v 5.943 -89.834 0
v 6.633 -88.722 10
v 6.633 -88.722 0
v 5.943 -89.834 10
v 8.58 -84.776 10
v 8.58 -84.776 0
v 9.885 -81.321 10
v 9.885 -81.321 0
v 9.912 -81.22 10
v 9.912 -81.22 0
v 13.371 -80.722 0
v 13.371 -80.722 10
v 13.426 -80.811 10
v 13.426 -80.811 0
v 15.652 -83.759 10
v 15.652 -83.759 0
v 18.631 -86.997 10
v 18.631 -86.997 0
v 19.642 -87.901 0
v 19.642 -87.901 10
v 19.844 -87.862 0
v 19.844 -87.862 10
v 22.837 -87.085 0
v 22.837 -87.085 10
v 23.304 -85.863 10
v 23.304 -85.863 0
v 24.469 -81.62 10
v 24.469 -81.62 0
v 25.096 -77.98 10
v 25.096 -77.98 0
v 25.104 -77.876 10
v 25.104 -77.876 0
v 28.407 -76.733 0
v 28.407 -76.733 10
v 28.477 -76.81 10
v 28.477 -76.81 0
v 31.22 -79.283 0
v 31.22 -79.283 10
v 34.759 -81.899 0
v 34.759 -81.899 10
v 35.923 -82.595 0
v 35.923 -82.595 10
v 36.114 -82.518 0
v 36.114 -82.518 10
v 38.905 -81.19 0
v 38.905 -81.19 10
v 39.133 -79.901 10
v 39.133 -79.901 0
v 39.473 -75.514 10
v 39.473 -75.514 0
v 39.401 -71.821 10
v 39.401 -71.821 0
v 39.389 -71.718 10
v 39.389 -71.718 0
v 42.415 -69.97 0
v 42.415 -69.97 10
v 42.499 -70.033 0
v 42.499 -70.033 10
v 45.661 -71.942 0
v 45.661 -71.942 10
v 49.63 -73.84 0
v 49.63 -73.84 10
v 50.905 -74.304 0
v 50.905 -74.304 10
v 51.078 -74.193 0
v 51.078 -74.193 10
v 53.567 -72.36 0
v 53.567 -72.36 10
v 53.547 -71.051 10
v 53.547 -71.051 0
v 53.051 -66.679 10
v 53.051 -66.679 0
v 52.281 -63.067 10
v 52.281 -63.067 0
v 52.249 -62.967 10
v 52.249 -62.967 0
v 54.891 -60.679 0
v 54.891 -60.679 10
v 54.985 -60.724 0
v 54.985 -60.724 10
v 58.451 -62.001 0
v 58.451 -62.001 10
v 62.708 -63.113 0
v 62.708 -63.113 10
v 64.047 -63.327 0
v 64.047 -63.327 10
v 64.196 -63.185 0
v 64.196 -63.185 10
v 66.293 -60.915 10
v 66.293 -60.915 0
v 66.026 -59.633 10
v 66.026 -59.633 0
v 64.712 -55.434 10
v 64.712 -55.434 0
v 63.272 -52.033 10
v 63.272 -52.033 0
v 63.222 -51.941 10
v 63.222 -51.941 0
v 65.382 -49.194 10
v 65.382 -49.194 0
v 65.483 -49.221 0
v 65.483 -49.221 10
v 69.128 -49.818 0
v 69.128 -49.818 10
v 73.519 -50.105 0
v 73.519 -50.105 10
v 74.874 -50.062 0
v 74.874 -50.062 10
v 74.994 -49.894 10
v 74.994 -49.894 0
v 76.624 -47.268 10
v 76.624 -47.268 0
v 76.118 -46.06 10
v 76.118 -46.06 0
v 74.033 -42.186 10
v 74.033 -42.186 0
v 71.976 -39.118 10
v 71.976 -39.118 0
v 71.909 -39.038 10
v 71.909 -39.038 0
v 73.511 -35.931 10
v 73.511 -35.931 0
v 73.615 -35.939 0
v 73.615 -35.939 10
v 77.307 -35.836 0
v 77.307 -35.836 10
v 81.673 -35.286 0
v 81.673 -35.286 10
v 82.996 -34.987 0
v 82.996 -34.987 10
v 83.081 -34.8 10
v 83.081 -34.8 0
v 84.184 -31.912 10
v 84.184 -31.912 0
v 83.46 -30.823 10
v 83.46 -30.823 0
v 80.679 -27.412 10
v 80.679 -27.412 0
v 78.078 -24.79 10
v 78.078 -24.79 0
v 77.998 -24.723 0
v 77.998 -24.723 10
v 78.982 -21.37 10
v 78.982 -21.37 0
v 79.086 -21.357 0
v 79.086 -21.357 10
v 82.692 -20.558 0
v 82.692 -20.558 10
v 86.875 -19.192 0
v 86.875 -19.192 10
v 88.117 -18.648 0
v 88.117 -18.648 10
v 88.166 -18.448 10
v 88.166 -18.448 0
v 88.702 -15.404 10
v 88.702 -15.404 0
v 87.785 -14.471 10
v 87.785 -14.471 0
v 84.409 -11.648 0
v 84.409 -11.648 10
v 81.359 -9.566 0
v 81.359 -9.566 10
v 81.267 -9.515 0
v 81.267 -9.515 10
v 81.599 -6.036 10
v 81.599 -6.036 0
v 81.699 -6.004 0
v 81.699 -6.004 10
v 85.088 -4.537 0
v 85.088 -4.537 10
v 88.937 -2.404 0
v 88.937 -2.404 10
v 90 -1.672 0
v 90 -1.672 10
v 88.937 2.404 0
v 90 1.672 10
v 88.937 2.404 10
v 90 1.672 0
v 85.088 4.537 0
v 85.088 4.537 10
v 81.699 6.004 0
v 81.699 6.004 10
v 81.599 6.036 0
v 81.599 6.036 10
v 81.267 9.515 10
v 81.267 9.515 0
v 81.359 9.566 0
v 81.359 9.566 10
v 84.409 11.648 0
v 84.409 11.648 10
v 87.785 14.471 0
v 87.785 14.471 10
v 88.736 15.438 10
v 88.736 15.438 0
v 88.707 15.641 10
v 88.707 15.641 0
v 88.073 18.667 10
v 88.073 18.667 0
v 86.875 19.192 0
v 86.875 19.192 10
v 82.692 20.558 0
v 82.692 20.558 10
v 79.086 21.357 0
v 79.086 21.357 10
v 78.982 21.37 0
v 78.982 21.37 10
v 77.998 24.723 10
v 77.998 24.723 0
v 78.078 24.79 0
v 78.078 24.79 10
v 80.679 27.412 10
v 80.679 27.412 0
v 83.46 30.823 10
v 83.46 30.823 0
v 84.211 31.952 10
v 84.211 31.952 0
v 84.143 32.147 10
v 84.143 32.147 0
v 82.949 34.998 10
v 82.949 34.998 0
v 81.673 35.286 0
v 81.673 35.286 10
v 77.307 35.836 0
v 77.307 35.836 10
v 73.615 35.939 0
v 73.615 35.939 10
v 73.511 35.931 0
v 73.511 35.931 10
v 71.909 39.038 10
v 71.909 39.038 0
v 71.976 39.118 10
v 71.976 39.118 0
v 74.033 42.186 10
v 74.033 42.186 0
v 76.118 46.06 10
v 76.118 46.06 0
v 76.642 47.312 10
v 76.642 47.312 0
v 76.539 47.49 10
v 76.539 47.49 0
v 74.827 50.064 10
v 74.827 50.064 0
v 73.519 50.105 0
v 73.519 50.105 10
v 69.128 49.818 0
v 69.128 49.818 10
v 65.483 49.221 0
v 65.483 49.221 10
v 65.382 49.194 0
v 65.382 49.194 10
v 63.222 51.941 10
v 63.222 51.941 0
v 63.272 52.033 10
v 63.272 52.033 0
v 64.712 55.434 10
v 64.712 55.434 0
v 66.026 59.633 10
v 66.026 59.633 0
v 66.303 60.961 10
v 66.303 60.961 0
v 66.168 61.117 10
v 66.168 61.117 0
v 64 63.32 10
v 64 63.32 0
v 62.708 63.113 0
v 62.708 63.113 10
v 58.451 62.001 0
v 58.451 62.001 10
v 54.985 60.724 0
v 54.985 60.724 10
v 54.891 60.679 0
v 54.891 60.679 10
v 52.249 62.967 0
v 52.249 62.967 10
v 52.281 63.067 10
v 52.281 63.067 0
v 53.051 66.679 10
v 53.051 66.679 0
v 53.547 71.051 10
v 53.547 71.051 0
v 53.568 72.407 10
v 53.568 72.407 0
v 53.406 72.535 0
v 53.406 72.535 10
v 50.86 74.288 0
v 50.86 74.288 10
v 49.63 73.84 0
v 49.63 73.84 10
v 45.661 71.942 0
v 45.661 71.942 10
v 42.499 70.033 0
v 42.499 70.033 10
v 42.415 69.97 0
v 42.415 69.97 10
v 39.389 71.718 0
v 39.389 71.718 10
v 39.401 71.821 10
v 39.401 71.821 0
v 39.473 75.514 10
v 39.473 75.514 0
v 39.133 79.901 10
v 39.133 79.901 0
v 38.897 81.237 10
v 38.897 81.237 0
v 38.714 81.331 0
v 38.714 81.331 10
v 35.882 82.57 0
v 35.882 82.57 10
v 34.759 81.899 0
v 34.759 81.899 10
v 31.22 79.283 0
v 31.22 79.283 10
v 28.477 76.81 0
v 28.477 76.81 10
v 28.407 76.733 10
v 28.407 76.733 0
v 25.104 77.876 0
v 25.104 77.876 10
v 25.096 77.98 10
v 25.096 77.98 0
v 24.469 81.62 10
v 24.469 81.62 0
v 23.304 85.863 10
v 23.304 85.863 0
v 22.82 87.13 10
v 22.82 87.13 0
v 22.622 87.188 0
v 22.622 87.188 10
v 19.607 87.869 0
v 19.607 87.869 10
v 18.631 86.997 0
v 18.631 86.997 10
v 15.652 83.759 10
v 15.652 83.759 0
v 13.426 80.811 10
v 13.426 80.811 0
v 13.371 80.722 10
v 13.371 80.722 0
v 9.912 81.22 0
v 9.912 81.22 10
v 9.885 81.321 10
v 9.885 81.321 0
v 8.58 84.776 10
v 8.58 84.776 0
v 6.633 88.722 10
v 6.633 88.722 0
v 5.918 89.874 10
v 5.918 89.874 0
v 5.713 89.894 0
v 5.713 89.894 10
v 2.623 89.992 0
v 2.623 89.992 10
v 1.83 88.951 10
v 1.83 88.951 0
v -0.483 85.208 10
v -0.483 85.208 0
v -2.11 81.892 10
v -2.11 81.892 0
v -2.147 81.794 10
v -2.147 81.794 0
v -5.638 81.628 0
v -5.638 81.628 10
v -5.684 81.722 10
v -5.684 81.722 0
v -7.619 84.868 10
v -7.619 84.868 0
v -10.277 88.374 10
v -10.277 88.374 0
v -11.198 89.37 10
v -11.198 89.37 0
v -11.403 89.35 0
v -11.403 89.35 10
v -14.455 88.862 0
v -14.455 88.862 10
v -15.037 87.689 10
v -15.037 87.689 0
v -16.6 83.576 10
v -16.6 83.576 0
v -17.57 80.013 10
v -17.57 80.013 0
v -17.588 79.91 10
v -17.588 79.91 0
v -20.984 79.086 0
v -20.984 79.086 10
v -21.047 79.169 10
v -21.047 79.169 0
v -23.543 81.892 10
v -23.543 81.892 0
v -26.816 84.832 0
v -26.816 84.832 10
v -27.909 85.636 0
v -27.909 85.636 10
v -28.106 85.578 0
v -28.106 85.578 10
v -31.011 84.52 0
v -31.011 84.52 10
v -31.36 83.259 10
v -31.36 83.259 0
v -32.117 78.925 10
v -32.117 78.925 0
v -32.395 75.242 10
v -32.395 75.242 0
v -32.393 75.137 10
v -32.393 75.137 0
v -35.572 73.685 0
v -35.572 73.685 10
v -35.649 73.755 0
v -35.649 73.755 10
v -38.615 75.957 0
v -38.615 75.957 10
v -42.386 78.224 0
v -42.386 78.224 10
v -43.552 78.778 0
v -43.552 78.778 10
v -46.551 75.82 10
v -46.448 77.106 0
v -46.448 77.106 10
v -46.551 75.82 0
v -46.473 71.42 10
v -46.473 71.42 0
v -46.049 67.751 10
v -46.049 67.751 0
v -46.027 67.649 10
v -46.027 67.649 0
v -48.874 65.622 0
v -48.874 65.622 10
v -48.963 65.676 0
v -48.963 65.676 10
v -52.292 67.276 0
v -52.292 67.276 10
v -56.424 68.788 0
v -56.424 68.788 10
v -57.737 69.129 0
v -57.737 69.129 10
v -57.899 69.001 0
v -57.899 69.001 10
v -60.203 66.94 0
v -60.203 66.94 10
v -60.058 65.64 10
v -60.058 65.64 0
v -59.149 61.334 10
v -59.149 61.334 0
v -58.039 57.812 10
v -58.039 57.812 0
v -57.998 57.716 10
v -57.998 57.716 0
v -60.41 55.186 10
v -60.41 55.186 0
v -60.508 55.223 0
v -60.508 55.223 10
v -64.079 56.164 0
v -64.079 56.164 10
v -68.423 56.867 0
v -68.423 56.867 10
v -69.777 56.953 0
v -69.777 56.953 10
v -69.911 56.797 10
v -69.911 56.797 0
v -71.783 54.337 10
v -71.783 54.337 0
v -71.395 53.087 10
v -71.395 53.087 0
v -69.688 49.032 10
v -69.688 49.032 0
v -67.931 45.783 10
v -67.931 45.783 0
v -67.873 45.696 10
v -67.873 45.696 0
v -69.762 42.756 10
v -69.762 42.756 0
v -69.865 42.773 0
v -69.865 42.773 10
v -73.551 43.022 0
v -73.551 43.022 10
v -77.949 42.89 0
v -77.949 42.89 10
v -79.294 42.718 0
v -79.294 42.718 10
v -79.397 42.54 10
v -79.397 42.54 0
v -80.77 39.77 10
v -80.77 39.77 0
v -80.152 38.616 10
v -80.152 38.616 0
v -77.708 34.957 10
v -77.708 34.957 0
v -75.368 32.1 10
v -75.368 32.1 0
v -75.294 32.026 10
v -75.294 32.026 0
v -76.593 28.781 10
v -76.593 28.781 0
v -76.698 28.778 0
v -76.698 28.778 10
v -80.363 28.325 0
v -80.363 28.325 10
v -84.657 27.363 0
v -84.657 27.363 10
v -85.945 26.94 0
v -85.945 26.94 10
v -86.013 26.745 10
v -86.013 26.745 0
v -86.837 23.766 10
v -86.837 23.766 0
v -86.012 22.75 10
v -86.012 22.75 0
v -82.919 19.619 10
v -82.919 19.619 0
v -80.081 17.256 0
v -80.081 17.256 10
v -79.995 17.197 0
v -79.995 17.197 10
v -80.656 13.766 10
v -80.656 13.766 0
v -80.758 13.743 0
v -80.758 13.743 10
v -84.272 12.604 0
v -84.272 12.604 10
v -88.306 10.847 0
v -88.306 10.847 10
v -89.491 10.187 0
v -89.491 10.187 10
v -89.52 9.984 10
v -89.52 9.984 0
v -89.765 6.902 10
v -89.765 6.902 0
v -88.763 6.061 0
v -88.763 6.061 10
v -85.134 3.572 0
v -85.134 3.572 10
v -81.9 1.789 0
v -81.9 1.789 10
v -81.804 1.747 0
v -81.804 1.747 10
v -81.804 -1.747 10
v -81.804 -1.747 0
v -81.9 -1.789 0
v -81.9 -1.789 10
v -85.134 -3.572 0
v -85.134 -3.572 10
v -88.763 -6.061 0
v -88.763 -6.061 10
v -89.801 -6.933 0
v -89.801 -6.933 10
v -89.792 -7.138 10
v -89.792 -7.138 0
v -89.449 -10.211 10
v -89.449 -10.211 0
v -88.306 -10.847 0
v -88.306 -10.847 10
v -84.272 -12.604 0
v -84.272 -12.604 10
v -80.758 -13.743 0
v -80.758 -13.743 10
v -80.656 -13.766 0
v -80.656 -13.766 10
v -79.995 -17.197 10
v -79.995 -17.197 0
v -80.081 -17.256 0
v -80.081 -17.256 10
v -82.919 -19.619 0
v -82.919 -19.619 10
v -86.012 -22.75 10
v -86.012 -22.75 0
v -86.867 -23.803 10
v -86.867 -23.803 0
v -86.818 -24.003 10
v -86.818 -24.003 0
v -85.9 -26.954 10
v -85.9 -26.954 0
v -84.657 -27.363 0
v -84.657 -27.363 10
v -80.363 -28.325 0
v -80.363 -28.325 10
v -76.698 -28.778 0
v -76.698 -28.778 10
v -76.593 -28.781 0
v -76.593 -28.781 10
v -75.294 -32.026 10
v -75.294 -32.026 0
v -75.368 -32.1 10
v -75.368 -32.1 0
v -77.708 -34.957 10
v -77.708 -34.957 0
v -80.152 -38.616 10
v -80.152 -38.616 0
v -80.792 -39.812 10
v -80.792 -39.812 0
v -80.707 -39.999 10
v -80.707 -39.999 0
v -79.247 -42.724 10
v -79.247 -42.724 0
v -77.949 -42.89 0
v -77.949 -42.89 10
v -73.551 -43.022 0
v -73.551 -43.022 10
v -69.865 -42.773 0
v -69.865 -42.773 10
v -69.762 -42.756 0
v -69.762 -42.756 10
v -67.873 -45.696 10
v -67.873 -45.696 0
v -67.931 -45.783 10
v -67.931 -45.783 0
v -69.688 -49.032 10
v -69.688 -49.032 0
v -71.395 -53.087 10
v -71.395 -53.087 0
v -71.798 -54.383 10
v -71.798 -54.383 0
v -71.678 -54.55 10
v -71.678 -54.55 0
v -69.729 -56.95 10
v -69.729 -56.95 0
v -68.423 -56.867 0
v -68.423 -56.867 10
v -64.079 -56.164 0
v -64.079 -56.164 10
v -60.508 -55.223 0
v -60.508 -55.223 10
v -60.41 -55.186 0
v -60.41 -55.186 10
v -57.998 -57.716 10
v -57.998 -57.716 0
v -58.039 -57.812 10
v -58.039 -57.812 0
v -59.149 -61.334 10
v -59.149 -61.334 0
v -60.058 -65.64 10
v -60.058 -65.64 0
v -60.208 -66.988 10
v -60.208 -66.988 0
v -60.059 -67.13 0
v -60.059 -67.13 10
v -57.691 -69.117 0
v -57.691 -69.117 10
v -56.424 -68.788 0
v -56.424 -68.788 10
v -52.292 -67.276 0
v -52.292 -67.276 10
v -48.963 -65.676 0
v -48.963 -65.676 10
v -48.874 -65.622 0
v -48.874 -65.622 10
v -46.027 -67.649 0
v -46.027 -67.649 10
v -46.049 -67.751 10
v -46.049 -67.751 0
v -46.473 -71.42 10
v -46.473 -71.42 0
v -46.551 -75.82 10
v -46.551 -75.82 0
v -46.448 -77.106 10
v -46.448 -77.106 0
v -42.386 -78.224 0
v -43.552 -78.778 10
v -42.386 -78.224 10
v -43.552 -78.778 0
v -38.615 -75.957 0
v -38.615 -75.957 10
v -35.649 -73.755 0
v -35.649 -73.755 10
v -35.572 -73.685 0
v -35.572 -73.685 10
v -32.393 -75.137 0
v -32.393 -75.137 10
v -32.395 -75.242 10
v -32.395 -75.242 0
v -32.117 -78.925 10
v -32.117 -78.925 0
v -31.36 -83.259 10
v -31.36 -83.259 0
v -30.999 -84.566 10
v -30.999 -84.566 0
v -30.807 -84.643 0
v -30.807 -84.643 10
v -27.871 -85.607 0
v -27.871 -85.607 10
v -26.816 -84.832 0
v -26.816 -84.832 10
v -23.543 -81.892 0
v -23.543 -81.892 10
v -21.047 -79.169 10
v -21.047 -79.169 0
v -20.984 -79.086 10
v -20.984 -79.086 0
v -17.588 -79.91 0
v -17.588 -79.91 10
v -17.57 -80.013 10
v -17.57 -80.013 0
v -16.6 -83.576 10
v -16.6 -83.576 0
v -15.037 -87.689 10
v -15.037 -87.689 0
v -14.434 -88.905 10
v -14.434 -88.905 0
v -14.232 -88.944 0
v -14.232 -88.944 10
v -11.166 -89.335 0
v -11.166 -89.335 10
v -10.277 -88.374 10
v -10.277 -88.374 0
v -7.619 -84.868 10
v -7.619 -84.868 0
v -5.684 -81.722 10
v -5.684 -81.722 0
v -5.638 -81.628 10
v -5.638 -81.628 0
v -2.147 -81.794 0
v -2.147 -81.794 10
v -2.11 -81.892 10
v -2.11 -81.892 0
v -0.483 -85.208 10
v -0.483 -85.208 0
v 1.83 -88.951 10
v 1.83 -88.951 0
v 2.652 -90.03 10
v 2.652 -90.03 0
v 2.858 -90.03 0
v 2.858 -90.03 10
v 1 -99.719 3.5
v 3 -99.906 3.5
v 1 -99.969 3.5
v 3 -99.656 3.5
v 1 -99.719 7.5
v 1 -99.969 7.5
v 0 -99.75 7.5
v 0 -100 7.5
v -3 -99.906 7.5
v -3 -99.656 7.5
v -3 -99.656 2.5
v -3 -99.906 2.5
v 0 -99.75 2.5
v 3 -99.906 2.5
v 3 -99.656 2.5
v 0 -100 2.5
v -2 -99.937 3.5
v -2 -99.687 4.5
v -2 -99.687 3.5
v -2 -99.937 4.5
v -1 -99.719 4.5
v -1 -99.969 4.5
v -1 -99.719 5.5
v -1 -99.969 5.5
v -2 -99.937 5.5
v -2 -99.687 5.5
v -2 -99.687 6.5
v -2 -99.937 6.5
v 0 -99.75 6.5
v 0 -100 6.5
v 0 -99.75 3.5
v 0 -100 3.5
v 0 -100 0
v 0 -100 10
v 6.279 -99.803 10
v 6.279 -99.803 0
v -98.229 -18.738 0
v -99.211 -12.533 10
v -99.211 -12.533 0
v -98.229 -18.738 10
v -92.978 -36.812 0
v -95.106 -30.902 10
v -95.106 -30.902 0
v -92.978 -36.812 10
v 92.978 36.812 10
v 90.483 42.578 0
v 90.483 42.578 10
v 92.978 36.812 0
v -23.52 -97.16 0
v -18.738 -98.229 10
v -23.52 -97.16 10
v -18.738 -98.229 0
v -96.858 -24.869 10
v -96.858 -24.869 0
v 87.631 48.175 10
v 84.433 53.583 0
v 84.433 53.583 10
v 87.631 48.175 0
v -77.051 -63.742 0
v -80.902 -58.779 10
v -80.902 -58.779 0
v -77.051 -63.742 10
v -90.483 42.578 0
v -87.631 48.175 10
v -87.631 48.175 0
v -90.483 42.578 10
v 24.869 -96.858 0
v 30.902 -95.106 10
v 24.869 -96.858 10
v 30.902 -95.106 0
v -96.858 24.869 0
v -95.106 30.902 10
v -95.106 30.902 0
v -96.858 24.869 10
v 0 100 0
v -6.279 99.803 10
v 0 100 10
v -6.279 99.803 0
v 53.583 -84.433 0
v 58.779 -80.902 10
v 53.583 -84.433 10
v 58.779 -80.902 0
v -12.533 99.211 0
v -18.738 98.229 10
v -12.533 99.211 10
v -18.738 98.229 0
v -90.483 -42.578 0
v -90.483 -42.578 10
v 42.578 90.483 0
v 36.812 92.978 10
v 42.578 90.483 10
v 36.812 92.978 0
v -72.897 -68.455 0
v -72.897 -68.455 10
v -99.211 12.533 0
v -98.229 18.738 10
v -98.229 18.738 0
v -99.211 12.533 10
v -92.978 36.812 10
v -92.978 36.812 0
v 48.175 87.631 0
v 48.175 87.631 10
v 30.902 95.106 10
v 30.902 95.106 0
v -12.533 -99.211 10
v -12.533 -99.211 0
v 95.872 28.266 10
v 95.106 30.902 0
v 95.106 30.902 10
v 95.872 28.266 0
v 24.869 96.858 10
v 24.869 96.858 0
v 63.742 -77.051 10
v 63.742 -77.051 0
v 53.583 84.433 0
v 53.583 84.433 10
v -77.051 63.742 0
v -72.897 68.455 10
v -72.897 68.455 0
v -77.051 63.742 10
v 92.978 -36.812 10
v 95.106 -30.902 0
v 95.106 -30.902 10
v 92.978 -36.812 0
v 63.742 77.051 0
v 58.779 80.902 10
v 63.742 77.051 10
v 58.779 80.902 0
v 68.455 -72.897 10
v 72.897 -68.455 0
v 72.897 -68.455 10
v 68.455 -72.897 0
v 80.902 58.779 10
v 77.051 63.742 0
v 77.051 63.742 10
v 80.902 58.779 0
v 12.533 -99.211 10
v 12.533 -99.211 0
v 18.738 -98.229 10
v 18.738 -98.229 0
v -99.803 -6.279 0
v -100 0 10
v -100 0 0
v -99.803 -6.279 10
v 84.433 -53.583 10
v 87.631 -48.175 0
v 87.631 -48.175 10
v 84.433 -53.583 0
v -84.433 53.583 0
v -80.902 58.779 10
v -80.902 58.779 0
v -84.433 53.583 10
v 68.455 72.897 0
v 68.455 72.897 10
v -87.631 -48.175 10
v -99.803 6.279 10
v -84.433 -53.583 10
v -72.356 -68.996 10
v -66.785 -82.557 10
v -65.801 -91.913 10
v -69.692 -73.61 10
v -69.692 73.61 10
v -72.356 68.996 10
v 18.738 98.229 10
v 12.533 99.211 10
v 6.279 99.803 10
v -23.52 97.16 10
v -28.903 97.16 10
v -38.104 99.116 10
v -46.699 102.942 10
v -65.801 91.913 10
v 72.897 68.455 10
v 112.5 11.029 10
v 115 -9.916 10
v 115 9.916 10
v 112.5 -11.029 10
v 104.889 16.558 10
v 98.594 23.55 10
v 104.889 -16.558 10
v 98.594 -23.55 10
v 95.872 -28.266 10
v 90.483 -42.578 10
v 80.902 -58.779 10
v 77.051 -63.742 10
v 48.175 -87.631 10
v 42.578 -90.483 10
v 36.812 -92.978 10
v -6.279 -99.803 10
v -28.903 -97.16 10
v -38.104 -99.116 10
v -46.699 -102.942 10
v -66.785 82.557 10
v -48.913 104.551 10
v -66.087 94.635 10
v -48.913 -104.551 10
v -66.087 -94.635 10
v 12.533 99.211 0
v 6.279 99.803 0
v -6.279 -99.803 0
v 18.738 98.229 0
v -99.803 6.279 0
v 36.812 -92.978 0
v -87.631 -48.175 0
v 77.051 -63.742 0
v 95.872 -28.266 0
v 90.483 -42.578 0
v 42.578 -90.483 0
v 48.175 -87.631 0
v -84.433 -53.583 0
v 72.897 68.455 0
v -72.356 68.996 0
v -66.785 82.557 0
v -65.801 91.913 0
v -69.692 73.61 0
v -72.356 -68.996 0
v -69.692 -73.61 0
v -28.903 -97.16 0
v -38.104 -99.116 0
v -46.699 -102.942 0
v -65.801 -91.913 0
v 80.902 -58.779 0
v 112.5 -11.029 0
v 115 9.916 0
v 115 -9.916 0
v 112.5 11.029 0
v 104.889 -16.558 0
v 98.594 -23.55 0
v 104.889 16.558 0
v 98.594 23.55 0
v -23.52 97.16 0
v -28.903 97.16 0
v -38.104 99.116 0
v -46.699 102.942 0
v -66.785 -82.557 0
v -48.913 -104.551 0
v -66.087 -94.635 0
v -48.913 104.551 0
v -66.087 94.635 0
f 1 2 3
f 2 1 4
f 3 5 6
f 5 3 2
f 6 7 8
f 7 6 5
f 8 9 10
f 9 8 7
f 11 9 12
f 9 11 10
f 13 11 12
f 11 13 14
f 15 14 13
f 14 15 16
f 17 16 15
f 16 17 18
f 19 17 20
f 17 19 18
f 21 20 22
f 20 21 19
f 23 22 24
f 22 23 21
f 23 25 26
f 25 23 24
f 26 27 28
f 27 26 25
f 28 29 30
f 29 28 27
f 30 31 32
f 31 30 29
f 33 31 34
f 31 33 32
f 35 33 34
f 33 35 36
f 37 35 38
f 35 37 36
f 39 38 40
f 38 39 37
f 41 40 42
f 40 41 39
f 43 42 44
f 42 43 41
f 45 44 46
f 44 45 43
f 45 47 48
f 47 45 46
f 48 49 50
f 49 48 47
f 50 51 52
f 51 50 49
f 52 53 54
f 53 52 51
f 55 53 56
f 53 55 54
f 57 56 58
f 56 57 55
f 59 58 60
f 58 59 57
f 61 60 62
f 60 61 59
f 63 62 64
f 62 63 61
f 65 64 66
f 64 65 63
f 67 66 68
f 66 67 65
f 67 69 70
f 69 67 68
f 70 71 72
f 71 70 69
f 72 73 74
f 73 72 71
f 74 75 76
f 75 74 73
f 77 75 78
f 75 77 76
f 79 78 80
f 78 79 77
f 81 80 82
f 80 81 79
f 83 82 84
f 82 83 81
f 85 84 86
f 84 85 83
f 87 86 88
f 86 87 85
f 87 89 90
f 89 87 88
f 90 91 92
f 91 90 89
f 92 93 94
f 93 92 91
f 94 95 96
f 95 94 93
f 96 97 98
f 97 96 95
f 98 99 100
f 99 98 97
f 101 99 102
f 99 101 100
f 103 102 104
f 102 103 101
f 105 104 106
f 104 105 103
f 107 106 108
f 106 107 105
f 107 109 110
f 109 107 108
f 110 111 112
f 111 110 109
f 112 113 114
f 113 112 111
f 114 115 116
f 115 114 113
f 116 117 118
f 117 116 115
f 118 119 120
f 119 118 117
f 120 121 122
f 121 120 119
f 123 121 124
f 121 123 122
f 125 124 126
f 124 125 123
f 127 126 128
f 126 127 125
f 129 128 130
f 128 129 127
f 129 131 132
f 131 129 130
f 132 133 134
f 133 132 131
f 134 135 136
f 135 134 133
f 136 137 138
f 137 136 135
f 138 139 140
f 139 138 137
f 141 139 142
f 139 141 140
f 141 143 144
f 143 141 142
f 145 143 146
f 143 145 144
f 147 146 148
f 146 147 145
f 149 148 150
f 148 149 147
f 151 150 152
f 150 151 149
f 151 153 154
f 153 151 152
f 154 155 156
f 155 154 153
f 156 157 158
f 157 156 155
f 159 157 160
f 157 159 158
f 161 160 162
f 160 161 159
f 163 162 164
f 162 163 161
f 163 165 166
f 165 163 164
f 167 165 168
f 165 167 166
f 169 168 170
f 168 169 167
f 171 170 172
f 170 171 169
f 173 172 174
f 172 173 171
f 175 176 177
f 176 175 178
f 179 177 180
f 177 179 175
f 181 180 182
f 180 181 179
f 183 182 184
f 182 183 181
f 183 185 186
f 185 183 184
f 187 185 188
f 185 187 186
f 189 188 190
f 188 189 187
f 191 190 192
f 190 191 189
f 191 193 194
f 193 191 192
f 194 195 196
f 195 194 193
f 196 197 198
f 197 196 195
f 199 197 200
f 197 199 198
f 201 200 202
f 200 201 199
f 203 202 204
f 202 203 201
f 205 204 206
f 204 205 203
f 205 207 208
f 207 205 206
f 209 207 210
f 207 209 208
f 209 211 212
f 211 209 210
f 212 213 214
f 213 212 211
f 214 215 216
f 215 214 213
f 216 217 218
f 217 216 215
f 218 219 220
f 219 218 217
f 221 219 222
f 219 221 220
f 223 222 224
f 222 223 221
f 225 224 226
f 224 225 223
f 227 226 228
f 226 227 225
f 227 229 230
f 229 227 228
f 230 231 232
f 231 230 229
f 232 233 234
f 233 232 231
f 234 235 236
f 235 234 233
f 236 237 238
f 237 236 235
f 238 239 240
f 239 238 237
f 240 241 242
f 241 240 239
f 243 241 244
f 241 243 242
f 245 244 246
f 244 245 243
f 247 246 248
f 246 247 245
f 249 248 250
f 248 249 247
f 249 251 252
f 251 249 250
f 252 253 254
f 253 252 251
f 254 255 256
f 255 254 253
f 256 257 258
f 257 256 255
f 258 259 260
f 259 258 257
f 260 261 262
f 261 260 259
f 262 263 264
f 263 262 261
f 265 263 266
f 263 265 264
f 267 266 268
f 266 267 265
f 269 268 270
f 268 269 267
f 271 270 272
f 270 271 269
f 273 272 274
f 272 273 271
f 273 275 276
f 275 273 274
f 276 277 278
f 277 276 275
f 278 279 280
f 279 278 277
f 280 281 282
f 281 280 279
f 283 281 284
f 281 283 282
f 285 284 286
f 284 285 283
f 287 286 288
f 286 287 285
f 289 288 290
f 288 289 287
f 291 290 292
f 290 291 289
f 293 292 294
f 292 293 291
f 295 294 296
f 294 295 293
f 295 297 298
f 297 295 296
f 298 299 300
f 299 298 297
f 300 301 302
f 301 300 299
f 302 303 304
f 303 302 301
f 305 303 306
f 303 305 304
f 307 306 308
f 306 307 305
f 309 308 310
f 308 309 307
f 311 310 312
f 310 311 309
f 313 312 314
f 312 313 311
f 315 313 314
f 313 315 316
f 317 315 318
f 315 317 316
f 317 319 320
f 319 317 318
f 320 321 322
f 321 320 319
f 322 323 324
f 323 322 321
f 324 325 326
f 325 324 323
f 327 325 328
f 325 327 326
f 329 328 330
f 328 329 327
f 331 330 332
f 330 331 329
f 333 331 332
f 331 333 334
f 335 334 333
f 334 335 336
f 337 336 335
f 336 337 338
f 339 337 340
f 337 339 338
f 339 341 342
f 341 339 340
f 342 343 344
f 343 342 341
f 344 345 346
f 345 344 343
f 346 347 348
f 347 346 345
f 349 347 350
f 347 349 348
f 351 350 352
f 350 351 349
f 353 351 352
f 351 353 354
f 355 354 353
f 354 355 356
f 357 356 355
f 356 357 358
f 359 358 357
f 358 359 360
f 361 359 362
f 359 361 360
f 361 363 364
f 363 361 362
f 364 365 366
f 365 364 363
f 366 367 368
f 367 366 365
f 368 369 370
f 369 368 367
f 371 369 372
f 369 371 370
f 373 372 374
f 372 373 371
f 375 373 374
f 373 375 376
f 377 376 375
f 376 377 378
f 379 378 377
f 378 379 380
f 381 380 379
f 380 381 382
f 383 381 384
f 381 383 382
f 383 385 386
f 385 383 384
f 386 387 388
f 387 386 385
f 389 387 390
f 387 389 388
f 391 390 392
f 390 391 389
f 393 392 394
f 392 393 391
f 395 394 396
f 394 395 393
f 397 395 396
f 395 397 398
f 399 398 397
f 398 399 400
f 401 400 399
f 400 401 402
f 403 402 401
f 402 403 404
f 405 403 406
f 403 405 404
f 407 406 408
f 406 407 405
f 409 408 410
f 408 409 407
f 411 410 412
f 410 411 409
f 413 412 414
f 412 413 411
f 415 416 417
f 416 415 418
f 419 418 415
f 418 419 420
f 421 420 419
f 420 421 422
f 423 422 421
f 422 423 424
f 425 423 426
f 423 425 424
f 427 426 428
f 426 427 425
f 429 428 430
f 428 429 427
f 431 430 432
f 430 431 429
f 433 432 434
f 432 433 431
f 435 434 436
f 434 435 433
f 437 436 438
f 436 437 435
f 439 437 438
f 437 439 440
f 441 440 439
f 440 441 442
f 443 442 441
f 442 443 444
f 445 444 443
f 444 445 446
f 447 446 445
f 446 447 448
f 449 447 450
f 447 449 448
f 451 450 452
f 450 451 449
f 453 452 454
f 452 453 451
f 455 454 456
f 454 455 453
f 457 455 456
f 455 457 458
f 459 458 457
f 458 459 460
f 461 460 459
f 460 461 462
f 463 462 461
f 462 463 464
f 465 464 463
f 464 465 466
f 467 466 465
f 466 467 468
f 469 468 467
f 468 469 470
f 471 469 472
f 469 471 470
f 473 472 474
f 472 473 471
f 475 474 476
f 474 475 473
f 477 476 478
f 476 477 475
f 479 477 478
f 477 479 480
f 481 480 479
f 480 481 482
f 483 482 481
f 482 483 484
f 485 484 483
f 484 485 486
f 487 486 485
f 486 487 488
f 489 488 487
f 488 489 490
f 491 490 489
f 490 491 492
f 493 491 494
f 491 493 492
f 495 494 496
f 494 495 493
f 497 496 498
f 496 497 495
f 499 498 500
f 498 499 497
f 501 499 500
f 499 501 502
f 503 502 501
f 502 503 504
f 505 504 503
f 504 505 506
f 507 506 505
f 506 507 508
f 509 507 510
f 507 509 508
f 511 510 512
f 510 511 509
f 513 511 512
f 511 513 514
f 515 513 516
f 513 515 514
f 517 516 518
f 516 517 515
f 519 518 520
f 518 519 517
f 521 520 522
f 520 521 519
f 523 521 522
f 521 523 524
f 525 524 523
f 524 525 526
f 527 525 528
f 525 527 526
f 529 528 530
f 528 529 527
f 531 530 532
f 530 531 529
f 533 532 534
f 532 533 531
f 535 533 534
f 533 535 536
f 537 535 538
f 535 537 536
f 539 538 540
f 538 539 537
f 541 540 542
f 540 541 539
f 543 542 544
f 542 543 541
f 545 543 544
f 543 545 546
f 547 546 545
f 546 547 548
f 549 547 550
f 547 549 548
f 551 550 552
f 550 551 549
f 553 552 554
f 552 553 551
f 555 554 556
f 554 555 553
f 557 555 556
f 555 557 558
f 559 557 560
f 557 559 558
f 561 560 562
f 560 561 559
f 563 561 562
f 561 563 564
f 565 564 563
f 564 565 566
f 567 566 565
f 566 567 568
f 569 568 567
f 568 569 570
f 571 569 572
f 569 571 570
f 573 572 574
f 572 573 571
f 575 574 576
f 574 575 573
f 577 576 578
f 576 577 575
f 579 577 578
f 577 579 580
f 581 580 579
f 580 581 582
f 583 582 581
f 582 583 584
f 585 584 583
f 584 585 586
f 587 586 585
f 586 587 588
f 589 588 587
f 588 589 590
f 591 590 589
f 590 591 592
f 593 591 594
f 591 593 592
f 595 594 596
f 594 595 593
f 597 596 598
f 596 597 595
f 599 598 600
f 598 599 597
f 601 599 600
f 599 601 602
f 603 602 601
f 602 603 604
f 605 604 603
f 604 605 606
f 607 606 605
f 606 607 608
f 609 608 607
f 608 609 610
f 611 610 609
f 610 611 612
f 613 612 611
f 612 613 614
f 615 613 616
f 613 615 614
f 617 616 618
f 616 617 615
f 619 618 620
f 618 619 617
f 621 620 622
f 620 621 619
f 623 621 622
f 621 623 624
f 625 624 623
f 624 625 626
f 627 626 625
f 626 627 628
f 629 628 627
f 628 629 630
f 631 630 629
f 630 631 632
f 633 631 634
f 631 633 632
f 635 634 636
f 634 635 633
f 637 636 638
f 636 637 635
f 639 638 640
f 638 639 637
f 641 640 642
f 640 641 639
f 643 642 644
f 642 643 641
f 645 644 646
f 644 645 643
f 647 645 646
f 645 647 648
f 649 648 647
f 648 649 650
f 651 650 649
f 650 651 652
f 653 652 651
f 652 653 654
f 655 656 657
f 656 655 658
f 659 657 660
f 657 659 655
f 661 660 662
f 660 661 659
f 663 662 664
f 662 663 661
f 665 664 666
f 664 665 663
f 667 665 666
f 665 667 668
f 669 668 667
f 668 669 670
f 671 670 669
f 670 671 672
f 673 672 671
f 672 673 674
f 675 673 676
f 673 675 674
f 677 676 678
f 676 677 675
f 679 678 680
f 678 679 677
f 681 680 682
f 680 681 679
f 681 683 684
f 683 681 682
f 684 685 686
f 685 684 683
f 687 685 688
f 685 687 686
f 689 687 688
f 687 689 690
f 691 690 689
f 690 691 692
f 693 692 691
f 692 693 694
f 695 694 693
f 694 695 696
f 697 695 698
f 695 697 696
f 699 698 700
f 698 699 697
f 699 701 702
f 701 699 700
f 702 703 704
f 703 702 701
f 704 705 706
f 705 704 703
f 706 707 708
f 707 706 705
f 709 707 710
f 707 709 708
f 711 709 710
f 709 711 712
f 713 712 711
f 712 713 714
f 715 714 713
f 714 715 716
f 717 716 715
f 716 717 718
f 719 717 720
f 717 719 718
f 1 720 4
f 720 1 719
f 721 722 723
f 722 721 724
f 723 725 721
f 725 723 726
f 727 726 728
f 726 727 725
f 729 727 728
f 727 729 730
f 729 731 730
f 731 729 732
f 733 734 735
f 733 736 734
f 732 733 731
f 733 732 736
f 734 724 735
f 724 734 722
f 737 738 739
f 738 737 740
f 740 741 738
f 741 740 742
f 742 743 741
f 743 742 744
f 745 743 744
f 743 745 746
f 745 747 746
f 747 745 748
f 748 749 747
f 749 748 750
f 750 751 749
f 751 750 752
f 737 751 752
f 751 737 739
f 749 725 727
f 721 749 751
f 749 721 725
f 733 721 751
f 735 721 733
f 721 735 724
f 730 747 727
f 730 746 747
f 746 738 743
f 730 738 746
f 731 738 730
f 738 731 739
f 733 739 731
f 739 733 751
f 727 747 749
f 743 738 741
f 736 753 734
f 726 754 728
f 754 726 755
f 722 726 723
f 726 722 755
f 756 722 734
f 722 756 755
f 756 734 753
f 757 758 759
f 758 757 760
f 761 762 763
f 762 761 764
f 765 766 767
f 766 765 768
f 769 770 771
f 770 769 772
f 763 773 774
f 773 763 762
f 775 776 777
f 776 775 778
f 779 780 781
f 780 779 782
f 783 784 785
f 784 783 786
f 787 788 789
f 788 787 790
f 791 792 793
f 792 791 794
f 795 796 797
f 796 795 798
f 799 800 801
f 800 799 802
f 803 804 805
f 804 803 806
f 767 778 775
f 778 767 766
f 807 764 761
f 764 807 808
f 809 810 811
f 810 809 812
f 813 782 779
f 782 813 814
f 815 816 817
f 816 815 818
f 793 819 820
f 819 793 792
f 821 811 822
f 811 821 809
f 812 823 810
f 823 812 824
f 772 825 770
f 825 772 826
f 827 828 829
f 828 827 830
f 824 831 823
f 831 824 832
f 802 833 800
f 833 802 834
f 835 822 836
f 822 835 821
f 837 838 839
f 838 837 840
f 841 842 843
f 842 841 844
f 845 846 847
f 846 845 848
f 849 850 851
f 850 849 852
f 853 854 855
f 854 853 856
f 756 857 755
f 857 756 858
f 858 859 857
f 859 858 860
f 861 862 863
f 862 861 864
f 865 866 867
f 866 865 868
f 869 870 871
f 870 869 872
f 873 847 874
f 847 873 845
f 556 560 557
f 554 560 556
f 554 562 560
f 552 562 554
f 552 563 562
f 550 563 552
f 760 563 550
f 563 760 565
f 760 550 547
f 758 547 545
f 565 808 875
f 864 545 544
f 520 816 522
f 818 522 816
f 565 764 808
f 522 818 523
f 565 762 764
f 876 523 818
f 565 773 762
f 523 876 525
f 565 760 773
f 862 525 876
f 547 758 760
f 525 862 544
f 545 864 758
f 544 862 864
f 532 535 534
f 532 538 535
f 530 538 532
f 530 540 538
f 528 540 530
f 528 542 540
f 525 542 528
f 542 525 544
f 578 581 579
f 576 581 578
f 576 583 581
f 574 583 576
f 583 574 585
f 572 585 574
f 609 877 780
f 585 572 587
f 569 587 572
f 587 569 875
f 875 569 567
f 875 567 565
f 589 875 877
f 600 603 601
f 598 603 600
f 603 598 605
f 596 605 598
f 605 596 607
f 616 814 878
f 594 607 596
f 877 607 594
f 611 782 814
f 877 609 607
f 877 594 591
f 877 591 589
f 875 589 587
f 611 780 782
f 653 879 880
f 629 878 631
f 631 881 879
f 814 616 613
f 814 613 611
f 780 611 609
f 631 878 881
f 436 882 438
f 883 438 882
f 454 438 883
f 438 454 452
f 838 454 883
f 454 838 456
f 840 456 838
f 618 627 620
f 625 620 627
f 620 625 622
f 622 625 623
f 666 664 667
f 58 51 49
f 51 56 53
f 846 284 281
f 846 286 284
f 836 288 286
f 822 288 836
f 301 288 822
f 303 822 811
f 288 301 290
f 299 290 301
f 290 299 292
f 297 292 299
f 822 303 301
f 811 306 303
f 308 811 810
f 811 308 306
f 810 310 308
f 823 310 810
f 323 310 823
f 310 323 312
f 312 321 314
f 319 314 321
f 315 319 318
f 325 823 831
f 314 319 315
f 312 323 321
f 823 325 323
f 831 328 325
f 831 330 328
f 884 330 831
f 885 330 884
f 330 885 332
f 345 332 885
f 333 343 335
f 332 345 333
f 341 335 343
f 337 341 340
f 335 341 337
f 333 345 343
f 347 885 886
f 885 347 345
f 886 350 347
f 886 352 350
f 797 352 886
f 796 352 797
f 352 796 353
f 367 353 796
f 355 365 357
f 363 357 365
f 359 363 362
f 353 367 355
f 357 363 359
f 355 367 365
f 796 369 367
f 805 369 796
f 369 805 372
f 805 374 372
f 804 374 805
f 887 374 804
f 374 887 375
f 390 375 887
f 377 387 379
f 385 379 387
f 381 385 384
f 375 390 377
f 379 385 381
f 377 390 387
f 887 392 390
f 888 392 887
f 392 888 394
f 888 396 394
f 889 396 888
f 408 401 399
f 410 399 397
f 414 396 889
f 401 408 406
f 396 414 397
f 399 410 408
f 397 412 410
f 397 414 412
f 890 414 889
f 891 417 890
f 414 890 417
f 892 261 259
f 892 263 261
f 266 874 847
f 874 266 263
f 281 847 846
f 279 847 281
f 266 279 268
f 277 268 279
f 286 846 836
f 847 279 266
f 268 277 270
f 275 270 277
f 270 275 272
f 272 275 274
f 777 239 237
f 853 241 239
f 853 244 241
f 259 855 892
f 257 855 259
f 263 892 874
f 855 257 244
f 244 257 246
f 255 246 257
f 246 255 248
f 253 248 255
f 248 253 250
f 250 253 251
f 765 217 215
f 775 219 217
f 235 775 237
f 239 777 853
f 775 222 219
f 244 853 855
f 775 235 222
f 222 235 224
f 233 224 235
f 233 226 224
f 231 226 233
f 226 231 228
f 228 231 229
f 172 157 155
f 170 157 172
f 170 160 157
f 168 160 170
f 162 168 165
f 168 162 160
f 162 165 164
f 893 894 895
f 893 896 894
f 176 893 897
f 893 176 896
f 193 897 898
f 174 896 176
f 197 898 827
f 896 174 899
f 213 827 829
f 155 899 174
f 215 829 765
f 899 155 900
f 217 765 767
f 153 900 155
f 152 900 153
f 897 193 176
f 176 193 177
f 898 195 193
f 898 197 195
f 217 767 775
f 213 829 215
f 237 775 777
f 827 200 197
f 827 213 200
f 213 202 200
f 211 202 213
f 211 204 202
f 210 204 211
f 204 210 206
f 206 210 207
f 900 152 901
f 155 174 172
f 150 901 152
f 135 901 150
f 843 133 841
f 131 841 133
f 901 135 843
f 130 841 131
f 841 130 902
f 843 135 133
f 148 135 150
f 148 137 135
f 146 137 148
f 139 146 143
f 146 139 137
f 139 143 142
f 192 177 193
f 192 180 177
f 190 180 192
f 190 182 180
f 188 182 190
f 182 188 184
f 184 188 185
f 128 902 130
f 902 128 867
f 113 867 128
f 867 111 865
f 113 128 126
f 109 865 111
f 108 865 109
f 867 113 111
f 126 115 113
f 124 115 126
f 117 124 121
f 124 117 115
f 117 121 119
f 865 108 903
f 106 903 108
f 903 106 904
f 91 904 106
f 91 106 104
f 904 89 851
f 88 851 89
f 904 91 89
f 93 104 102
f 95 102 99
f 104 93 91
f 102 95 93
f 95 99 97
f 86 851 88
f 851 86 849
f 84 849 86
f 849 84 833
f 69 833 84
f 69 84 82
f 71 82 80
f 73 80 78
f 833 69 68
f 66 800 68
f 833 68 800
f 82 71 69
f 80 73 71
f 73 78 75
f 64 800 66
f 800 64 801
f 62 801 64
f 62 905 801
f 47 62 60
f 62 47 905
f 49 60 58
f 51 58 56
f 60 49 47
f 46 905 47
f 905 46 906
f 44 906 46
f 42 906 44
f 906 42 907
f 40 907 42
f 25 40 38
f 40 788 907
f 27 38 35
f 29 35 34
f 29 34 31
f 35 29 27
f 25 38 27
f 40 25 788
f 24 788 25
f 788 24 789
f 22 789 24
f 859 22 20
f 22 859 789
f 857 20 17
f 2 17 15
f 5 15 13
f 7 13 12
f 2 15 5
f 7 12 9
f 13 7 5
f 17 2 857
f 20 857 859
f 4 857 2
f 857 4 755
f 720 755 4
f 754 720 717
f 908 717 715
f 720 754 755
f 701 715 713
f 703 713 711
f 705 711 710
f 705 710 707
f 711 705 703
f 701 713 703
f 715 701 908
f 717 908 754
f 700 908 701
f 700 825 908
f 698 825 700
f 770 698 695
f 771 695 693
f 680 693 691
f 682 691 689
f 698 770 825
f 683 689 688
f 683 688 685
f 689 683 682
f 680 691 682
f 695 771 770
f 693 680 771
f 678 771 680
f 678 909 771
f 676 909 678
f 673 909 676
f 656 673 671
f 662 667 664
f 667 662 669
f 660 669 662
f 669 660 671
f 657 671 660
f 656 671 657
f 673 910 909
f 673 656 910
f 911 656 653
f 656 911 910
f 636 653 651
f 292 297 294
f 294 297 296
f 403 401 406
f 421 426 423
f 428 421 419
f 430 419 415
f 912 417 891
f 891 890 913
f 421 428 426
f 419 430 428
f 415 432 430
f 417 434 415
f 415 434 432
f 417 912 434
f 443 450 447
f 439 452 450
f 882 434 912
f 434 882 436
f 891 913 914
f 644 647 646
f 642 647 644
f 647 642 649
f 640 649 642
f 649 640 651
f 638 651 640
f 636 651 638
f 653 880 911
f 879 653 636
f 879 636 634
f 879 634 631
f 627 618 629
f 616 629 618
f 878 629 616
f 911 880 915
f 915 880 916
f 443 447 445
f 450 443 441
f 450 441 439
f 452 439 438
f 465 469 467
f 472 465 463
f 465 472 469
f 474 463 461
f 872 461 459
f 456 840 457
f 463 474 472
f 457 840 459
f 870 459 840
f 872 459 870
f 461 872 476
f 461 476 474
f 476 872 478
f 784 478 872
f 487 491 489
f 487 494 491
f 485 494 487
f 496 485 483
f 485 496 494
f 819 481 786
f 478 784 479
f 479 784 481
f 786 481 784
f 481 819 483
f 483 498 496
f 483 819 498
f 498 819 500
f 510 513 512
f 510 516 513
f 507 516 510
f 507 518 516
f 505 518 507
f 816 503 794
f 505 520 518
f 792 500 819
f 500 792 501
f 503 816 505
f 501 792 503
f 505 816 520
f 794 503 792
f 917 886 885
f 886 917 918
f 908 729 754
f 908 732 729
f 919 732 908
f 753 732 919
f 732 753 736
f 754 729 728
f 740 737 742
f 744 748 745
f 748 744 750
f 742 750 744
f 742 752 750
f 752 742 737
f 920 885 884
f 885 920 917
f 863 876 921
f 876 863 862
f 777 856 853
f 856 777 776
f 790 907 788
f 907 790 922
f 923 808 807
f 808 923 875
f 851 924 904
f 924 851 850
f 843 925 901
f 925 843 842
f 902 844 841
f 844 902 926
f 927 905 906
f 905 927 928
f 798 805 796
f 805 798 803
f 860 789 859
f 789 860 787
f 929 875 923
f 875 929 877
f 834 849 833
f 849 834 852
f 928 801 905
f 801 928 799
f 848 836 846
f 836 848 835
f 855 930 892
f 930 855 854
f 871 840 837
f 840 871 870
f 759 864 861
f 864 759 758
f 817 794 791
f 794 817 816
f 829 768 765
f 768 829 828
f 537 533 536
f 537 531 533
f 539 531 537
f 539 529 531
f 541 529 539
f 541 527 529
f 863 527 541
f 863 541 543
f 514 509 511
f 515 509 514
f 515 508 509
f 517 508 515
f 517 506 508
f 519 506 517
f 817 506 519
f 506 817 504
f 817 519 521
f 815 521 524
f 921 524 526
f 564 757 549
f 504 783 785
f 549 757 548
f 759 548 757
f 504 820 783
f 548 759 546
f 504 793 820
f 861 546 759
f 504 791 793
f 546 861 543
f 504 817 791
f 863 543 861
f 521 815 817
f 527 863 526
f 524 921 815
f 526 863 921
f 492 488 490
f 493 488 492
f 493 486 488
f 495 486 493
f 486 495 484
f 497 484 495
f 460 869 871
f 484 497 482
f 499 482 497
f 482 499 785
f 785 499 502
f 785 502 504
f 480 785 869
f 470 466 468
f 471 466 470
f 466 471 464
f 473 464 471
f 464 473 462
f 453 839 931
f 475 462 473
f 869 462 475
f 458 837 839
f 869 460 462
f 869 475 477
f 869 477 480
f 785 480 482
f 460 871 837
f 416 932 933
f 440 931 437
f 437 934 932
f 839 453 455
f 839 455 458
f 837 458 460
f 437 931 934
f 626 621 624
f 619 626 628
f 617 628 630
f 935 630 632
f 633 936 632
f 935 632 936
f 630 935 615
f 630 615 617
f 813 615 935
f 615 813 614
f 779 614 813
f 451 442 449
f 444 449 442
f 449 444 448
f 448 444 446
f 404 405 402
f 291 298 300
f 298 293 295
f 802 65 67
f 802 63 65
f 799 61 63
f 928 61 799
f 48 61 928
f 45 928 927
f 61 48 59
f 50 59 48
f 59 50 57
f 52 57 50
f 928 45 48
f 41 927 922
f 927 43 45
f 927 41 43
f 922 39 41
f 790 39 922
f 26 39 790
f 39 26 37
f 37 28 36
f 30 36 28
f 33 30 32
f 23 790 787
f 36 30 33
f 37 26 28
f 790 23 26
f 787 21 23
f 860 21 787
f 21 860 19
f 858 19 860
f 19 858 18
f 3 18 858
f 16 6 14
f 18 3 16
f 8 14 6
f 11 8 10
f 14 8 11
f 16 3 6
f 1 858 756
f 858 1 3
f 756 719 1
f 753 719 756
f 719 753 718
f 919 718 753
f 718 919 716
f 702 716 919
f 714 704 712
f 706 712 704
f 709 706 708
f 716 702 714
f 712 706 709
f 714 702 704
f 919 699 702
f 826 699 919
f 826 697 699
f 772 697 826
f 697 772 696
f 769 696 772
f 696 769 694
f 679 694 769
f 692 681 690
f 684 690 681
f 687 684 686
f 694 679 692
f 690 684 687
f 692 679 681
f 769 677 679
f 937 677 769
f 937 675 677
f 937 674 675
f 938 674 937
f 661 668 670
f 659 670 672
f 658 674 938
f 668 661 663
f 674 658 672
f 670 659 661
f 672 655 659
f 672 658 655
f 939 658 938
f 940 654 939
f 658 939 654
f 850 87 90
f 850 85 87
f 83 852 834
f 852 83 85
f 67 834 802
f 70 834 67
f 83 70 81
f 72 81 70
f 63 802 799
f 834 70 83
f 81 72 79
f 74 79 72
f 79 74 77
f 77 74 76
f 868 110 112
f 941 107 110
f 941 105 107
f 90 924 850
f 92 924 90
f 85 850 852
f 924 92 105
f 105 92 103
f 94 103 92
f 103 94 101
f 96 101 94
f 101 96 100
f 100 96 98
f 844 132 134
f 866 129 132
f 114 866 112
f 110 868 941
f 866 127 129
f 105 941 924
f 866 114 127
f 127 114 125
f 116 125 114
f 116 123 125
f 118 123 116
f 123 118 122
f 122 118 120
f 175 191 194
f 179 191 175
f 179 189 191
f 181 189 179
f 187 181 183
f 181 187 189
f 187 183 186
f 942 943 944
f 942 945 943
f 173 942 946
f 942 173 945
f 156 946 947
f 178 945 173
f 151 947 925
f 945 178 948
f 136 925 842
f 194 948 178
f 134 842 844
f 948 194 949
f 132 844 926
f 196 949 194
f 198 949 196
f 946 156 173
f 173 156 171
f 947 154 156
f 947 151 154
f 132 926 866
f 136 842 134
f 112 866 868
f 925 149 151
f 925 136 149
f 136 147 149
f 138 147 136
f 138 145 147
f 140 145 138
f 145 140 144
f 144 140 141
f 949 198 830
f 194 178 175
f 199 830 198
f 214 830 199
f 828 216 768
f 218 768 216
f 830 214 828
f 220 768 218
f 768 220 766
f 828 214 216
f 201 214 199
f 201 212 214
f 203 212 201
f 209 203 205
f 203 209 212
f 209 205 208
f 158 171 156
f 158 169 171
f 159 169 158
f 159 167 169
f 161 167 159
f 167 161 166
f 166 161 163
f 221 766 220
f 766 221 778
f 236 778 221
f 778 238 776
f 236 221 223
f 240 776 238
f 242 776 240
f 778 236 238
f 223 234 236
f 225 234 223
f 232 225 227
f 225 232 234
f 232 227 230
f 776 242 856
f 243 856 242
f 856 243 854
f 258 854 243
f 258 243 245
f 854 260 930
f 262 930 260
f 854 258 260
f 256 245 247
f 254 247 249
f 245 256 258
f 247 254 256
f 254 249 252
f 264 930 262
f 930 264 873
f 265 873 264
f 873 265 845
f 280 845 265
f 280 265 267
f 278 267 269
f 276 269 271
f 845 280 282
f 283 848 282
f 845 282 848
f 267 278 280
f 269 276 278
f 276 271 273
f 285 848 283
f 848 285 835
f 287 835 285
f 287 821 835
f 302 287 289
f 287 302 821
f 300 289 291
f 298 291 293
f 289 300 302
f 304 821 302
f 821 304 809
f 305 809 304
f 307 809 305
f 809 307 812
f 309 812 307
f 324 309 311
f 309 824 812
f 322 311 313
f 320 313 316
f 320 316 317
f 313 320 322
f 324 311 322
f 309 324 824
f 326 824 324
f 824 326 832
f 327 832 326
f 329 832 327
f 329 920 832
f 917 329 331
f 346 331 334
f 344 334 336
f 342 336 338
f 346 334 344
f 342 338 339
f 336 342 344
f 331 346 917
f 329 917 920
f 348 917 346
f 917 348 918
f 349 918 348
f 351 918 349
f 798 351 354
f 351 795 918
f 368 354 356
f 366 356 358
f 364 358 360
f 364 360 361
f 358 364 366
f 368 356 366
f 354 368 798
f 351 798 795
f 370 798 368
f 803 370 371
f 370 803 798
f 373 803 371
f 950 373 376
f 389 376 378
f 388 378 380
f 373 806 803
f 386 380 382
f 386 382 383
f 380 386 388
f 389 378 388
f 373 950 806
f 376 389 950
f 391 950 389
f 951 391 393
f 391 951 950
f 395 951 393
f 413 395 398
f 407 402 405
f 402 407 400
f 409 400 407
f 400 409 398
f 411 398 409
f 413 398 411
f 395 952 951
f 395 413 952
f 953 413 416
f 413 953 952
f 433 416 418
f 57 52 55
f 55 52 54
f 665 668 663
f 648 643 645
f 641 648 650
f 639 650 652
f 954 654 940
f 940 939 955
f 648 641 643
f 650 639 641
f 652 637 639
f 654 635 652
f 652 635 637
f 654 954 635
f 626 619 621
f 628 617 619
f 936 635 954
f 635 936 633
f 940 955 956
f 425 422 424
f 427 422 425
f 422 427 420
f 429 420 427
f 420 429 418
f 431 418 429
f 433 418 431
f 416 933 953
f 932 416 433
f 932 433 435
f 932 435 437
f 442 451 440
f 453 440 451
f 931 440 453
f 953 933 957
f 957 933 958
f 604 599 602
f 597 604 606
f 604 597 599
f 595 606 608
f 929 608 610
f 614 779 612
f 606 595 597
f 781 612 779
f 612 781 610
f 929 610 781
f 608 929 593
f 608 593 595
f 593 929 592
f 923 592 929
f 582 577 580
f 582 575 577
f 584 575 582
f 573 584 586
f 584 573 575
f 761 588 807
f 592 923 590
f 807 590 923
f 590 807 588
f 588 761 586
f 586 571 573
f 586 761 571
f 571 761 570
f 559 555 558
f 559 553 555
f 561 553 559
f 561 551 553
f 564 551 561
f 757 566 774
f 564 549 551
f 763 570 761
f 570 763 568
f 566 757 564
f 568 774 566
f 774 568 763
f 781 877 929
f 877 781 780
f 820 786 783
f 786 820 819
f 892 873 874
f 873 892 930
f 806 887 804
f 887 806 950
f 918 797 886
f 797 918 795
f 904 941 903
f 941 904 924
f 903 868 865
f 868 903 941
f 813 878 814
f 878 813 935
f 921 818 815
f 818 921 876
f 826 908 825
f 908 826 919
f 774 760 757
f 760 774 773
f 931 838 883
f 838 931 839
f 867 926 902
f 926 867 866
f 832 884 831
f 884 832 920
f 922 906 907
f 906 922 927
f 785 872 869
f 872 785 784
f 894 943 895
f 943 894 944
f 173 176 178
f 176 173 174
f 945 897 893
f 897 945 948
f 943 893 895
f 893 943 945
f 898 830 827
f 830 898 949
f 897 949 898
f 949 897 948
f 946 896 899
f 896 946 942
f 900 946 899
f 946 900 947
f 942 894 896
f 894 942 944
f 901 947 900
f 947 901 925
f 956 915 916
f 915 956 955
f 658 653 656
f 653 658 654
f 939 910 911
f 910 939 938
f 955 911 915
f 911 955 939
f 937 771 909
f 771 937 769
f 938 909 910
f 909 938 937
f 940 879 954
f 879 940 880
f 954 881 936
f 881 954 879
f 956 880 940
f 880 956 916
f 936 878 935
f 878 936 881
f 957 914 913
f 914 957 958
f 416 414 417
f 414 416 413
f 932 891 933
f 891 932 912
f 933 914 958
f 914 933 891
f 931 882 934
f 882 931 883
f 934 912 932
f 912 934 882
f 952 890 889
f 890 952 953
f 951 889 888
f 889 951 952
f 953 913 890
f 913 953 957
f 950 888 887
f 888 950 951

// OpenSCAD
// Planetary gear bearing (customizable)

// outer diameter of ring
D=200;
// thickness
T=10;
// clearance
tol=0.15;
number_of_planets=3;
number_of_teeth_on_planets=12;
approximate_number_of_teeth_on_sun=8;
// pressure angle
P=30;//[30:60]
// number of teeth to twist across
nTwist=0;
// Shaft radius.  For round saft with a flat.
sd=27.9;
// Shaft thinkness at flat  For round saft with a flat..
st=27.9;
// Shaft type: 0=hex, 1=round w/flat.
stype=1;
// Planet axile diameter.
pad=10;

DR=0.5*1;// maximum depth ratio of teeth

m=round(number_of_planets);
np=round(number_of_teeth_on_planets);
ns1=approximate_number_of_teeth_on_sun;
k1=round(2/m*(ns1+np));
k= k1*m%2!=0 ? k1+1 : k1;
ns=k*m/2-np;
echo(ns);
nr=ns+2*np;
pitchD=0.9*D/(1+min(PI/(2*nr*tan(P)),PI*DR/nr));
pitch=pitchD*PI/nr;
echo(pitch);
helix_angle=atan(2*nTwist*pitch/T);
echo(helix_angle);

phi=$t*360/m;

translate([0,0,T/2]){
	difference(){ // This makes the outer ring.
		cylinder(r=D/2,h=T,center=true,$fn=100);
		herringbone(nr,pitch,P,DR,-tol,helix_angle,T+0.2);
		difference(){
			translate([0,-D/2,0])rotate([90,0,0])monogram(h=10);
			cylinder(r=D/2-0.25,h=T+2,center=true,$fn=100);
		}
	}
    // add bite to ring
//    rotate([0,0,5.454])
  //      translate([120,-10,-T/2])
    //        rotate([0,270,90])
      //          prism(T,30,30);
    rotate([0,0,0])
      bite();

      rotate([0,0,240])
          bite();

    
      rotate([0,0,120])
          bite();
/*        
	rotate([0,0,(np+1)*180/ns+phi*(ns+np)*2/ns])
	difference(){ // This makes the sun.
		mirror([0,1,0])
			herringbone(ns,pitch,P,DR,tol,helix_angle,T);
		if(stype==0)
			cylinder(r=w/sqrt(3),h=T+1,center=true,$fn=6);
		else
			difference(){ // This makes a hole for a flat shaft.
				cylinder(r=sd/2,h=T+1,center=true,$fn=100);
				translate([st-(sd/2),-(sd/2),-(T+1)/2])
					cube([sd, sd, T+1]);	// This is the flat in the shaft hole.
			}
	}
	// Now make the planets.
	for(i=[1:m])
		rotate([0,0,i*360/m+phi])
			translate([pitchD/2*(ns+np)/nr,0,0])
				rotate([0,0,i*ns/m*360/np-phi*(ns+np)/np-phi])
					difference(){ // make an axial hole in each planet.
						herringbone(np/2,pitch,P,DR,tol,helix_angle,T);
						cylinder(r=pad/2,h=T+1,center=true,$fn=100);	// This is the hole.
					}
*/
}

module bite()
{
          translate([90,-40,-T/2])
            difference() 
            {
                cube(size=[25,80,10]);
                translate([45,90,0])
                    cylinder(h=10, r=45);
                translate([45,-10,0])
                    cylinder(h=10, r=45);
            }
        }


// Makes the teeth on the inside of the outer ring.
module monogram(h=1)
linear_extrude(height=h,center=true)
translate(-[3,2.5])union(){
	difference(){
		square([4,5]);
		translate([1,1])square([2,3]);
	}
	square([6,1]);
	translate([0,2])square([2,1]);
}

module herringbone(
	number_of_teeth=15,
	circular_pitch=10,
	pressure_angle=28,
	depth_ratio=1,
	clearance=0,
	helix_angle=0,
	gear_thickness=5){
union(){
	gear(number_of_teeth,
		circular_pitch,
		pressure_angle,
		depth_ratio,
		clearance,
		helix_angle,
		gear_thickness/2);
	mirror([0,0,1])
		gear(number_of_teeth,
			circular_pitch,
			pressure_angle,
			depth_ratio,
			clearance,
			helix_angle,
			gear_thickness/2);
}}

module gear (
	number_of_teeth=15,
	circular_pitch=10,
	pressure_angle=28,
	depth_ratio=1,
	clearance=0,
	helix_angle=0,
	gear_thickness=5,
	flat=false){
pitch_radius = number_of_teeth*circular_pitch/(2*PI);
twist=tan(helix_angle)*gear_thickness/pitch_radius*180/PI;

flat_extrude(h=gear_thickness,twist=twist,flat=flat)
	gear2D (
		number_of_teeth,
		circular_pitch,
		pressure_angle,
		depth_ratio,
		clearance);
}

module flat_extrude(h,twist,flat){
	if(flat==false)
		linear_extrude(height=h,twist=twist,slices=twist/6)child(0);
	else
		child(0);
}

module gear2D (
	number_of_teeth,
	circular_pitch,
	pressure_angle,
	depth_ratio,
	clearance){
pitch_radius = number_of_teeth*circular_pitch/(2*PI);
base_radius = pitch_radius*cos(pressure_angle);
depth=circular_pitch/(2*tan(pressure_angle));
outer_radius = clearance<0 ? pitch_radius+depth/2-clearance : pitch_radius+depth/2;
root_radius1 = pitch_radius-depth/2-clearance/2;
root_radius = (clearance<0 && root_radius1<base_radius) ? base_radius : root_radius1;
backlash_angle = clearance/(pitch_radius*cos(pressure_angle)) * 180 / PI;
half_thick_angle = 90/number_of_teeth - backlash_angle/2;
pitch_point = involute (base_radius, involute_intersect_angle (base_radius, pitch_radius));
pitch_angle = atan2 (pitch_point[1], pitch_point[0]);
min_radius = max (base_radius,root_radius);

intersection(){
	rotate(90/number_of_teeth)
		circle($fn=number_of_teeth*3,r=pitch_radius+depth_ratio*circular_pitch/2-clearance/2);
	union(){
		rotate(90/number_of_teeth)
			circle($fn=number_of_teeth*2,r=max(root_radius,pitch_radius-depth_ratio*circular_pitch/2-clearance/2));
		for (i = [1:number_of_teeth])rotate(i*360/number_of_teeth){
			halftooth (
				pitch_angle,
				base_radius,
				min_radius,
				outer_radius,
				half_thick_angle);		
			mirror([0,1])halftooth (
				pitch_angle,
				base_radius,
				min_radius,
				outer_radius,
				half_thick_angle);
		}
	}
}}

module halftooth (
	pitch_angle,
	base_radius,
	min_radius,
	outer_radius,
	half_thick_angle){
index=[0,1,2,3,4,5];
start_angle = max(involute_intersect_angle (base_radius, min_radius)-5,0);
stop_angle = involute_intersect_angle (base_radius, outer_radius);
angle=index*(stop_angle-start_angle)/index[len(index)-1];
p=[[0,0], // The more of these the smoother the involute shape of the teeth.
	involute(base_radius,angle[0]+start_angle),
	involute(base_radius,angle[1]+start_angle),
	involute(base_radius,angle[2]+start_angle),
	involute(base_radius,angle[3]+start_angle),
	involute(base_radius,angle[4]+start_angle),
	involute(base_radius,angle[5]+start_angle)];

difference(){
	rotate(-pitch_angle-half_thick_angle)polygon(points=p);
	square(2*outer_radius);
}}

// Mathematical Functions
//===============

// Finds the angle of the involute about the base radius at the given distance (radius) from it's center.
//source: http://www.mathhelpforum.com/math-help/geometry/136011-circle-involute-solving-y-any-given-x.html

function involute_intersect_angle (base_radius, radius) = sqrt (pow (radius/base_radius, 2) - 1) * 180 / PI;

// Calculate the involute position for a given base radius and involute angle.

function involute (base_radius, involute_angle) =
[
	base_radius*(cos (involute_angle) + involute_angle*PI/180*sin (involute_angle)),
	base_radius*(sin (involute_angle) - involute_angle*PI/180*cos (involute_angle))
];



// prism function from openscad wiki
module prism(l, w, h){
   polyhedron(
       points=[[0,0,0], [l,0,0], [l,w,0], [0,w,0], [0,w,h], [l,w,h]],
       faces=[[0,1,2,3],[5,4,3,2],[0,4,5,1],[0,3,4],[5,2,1]]
     );
}
